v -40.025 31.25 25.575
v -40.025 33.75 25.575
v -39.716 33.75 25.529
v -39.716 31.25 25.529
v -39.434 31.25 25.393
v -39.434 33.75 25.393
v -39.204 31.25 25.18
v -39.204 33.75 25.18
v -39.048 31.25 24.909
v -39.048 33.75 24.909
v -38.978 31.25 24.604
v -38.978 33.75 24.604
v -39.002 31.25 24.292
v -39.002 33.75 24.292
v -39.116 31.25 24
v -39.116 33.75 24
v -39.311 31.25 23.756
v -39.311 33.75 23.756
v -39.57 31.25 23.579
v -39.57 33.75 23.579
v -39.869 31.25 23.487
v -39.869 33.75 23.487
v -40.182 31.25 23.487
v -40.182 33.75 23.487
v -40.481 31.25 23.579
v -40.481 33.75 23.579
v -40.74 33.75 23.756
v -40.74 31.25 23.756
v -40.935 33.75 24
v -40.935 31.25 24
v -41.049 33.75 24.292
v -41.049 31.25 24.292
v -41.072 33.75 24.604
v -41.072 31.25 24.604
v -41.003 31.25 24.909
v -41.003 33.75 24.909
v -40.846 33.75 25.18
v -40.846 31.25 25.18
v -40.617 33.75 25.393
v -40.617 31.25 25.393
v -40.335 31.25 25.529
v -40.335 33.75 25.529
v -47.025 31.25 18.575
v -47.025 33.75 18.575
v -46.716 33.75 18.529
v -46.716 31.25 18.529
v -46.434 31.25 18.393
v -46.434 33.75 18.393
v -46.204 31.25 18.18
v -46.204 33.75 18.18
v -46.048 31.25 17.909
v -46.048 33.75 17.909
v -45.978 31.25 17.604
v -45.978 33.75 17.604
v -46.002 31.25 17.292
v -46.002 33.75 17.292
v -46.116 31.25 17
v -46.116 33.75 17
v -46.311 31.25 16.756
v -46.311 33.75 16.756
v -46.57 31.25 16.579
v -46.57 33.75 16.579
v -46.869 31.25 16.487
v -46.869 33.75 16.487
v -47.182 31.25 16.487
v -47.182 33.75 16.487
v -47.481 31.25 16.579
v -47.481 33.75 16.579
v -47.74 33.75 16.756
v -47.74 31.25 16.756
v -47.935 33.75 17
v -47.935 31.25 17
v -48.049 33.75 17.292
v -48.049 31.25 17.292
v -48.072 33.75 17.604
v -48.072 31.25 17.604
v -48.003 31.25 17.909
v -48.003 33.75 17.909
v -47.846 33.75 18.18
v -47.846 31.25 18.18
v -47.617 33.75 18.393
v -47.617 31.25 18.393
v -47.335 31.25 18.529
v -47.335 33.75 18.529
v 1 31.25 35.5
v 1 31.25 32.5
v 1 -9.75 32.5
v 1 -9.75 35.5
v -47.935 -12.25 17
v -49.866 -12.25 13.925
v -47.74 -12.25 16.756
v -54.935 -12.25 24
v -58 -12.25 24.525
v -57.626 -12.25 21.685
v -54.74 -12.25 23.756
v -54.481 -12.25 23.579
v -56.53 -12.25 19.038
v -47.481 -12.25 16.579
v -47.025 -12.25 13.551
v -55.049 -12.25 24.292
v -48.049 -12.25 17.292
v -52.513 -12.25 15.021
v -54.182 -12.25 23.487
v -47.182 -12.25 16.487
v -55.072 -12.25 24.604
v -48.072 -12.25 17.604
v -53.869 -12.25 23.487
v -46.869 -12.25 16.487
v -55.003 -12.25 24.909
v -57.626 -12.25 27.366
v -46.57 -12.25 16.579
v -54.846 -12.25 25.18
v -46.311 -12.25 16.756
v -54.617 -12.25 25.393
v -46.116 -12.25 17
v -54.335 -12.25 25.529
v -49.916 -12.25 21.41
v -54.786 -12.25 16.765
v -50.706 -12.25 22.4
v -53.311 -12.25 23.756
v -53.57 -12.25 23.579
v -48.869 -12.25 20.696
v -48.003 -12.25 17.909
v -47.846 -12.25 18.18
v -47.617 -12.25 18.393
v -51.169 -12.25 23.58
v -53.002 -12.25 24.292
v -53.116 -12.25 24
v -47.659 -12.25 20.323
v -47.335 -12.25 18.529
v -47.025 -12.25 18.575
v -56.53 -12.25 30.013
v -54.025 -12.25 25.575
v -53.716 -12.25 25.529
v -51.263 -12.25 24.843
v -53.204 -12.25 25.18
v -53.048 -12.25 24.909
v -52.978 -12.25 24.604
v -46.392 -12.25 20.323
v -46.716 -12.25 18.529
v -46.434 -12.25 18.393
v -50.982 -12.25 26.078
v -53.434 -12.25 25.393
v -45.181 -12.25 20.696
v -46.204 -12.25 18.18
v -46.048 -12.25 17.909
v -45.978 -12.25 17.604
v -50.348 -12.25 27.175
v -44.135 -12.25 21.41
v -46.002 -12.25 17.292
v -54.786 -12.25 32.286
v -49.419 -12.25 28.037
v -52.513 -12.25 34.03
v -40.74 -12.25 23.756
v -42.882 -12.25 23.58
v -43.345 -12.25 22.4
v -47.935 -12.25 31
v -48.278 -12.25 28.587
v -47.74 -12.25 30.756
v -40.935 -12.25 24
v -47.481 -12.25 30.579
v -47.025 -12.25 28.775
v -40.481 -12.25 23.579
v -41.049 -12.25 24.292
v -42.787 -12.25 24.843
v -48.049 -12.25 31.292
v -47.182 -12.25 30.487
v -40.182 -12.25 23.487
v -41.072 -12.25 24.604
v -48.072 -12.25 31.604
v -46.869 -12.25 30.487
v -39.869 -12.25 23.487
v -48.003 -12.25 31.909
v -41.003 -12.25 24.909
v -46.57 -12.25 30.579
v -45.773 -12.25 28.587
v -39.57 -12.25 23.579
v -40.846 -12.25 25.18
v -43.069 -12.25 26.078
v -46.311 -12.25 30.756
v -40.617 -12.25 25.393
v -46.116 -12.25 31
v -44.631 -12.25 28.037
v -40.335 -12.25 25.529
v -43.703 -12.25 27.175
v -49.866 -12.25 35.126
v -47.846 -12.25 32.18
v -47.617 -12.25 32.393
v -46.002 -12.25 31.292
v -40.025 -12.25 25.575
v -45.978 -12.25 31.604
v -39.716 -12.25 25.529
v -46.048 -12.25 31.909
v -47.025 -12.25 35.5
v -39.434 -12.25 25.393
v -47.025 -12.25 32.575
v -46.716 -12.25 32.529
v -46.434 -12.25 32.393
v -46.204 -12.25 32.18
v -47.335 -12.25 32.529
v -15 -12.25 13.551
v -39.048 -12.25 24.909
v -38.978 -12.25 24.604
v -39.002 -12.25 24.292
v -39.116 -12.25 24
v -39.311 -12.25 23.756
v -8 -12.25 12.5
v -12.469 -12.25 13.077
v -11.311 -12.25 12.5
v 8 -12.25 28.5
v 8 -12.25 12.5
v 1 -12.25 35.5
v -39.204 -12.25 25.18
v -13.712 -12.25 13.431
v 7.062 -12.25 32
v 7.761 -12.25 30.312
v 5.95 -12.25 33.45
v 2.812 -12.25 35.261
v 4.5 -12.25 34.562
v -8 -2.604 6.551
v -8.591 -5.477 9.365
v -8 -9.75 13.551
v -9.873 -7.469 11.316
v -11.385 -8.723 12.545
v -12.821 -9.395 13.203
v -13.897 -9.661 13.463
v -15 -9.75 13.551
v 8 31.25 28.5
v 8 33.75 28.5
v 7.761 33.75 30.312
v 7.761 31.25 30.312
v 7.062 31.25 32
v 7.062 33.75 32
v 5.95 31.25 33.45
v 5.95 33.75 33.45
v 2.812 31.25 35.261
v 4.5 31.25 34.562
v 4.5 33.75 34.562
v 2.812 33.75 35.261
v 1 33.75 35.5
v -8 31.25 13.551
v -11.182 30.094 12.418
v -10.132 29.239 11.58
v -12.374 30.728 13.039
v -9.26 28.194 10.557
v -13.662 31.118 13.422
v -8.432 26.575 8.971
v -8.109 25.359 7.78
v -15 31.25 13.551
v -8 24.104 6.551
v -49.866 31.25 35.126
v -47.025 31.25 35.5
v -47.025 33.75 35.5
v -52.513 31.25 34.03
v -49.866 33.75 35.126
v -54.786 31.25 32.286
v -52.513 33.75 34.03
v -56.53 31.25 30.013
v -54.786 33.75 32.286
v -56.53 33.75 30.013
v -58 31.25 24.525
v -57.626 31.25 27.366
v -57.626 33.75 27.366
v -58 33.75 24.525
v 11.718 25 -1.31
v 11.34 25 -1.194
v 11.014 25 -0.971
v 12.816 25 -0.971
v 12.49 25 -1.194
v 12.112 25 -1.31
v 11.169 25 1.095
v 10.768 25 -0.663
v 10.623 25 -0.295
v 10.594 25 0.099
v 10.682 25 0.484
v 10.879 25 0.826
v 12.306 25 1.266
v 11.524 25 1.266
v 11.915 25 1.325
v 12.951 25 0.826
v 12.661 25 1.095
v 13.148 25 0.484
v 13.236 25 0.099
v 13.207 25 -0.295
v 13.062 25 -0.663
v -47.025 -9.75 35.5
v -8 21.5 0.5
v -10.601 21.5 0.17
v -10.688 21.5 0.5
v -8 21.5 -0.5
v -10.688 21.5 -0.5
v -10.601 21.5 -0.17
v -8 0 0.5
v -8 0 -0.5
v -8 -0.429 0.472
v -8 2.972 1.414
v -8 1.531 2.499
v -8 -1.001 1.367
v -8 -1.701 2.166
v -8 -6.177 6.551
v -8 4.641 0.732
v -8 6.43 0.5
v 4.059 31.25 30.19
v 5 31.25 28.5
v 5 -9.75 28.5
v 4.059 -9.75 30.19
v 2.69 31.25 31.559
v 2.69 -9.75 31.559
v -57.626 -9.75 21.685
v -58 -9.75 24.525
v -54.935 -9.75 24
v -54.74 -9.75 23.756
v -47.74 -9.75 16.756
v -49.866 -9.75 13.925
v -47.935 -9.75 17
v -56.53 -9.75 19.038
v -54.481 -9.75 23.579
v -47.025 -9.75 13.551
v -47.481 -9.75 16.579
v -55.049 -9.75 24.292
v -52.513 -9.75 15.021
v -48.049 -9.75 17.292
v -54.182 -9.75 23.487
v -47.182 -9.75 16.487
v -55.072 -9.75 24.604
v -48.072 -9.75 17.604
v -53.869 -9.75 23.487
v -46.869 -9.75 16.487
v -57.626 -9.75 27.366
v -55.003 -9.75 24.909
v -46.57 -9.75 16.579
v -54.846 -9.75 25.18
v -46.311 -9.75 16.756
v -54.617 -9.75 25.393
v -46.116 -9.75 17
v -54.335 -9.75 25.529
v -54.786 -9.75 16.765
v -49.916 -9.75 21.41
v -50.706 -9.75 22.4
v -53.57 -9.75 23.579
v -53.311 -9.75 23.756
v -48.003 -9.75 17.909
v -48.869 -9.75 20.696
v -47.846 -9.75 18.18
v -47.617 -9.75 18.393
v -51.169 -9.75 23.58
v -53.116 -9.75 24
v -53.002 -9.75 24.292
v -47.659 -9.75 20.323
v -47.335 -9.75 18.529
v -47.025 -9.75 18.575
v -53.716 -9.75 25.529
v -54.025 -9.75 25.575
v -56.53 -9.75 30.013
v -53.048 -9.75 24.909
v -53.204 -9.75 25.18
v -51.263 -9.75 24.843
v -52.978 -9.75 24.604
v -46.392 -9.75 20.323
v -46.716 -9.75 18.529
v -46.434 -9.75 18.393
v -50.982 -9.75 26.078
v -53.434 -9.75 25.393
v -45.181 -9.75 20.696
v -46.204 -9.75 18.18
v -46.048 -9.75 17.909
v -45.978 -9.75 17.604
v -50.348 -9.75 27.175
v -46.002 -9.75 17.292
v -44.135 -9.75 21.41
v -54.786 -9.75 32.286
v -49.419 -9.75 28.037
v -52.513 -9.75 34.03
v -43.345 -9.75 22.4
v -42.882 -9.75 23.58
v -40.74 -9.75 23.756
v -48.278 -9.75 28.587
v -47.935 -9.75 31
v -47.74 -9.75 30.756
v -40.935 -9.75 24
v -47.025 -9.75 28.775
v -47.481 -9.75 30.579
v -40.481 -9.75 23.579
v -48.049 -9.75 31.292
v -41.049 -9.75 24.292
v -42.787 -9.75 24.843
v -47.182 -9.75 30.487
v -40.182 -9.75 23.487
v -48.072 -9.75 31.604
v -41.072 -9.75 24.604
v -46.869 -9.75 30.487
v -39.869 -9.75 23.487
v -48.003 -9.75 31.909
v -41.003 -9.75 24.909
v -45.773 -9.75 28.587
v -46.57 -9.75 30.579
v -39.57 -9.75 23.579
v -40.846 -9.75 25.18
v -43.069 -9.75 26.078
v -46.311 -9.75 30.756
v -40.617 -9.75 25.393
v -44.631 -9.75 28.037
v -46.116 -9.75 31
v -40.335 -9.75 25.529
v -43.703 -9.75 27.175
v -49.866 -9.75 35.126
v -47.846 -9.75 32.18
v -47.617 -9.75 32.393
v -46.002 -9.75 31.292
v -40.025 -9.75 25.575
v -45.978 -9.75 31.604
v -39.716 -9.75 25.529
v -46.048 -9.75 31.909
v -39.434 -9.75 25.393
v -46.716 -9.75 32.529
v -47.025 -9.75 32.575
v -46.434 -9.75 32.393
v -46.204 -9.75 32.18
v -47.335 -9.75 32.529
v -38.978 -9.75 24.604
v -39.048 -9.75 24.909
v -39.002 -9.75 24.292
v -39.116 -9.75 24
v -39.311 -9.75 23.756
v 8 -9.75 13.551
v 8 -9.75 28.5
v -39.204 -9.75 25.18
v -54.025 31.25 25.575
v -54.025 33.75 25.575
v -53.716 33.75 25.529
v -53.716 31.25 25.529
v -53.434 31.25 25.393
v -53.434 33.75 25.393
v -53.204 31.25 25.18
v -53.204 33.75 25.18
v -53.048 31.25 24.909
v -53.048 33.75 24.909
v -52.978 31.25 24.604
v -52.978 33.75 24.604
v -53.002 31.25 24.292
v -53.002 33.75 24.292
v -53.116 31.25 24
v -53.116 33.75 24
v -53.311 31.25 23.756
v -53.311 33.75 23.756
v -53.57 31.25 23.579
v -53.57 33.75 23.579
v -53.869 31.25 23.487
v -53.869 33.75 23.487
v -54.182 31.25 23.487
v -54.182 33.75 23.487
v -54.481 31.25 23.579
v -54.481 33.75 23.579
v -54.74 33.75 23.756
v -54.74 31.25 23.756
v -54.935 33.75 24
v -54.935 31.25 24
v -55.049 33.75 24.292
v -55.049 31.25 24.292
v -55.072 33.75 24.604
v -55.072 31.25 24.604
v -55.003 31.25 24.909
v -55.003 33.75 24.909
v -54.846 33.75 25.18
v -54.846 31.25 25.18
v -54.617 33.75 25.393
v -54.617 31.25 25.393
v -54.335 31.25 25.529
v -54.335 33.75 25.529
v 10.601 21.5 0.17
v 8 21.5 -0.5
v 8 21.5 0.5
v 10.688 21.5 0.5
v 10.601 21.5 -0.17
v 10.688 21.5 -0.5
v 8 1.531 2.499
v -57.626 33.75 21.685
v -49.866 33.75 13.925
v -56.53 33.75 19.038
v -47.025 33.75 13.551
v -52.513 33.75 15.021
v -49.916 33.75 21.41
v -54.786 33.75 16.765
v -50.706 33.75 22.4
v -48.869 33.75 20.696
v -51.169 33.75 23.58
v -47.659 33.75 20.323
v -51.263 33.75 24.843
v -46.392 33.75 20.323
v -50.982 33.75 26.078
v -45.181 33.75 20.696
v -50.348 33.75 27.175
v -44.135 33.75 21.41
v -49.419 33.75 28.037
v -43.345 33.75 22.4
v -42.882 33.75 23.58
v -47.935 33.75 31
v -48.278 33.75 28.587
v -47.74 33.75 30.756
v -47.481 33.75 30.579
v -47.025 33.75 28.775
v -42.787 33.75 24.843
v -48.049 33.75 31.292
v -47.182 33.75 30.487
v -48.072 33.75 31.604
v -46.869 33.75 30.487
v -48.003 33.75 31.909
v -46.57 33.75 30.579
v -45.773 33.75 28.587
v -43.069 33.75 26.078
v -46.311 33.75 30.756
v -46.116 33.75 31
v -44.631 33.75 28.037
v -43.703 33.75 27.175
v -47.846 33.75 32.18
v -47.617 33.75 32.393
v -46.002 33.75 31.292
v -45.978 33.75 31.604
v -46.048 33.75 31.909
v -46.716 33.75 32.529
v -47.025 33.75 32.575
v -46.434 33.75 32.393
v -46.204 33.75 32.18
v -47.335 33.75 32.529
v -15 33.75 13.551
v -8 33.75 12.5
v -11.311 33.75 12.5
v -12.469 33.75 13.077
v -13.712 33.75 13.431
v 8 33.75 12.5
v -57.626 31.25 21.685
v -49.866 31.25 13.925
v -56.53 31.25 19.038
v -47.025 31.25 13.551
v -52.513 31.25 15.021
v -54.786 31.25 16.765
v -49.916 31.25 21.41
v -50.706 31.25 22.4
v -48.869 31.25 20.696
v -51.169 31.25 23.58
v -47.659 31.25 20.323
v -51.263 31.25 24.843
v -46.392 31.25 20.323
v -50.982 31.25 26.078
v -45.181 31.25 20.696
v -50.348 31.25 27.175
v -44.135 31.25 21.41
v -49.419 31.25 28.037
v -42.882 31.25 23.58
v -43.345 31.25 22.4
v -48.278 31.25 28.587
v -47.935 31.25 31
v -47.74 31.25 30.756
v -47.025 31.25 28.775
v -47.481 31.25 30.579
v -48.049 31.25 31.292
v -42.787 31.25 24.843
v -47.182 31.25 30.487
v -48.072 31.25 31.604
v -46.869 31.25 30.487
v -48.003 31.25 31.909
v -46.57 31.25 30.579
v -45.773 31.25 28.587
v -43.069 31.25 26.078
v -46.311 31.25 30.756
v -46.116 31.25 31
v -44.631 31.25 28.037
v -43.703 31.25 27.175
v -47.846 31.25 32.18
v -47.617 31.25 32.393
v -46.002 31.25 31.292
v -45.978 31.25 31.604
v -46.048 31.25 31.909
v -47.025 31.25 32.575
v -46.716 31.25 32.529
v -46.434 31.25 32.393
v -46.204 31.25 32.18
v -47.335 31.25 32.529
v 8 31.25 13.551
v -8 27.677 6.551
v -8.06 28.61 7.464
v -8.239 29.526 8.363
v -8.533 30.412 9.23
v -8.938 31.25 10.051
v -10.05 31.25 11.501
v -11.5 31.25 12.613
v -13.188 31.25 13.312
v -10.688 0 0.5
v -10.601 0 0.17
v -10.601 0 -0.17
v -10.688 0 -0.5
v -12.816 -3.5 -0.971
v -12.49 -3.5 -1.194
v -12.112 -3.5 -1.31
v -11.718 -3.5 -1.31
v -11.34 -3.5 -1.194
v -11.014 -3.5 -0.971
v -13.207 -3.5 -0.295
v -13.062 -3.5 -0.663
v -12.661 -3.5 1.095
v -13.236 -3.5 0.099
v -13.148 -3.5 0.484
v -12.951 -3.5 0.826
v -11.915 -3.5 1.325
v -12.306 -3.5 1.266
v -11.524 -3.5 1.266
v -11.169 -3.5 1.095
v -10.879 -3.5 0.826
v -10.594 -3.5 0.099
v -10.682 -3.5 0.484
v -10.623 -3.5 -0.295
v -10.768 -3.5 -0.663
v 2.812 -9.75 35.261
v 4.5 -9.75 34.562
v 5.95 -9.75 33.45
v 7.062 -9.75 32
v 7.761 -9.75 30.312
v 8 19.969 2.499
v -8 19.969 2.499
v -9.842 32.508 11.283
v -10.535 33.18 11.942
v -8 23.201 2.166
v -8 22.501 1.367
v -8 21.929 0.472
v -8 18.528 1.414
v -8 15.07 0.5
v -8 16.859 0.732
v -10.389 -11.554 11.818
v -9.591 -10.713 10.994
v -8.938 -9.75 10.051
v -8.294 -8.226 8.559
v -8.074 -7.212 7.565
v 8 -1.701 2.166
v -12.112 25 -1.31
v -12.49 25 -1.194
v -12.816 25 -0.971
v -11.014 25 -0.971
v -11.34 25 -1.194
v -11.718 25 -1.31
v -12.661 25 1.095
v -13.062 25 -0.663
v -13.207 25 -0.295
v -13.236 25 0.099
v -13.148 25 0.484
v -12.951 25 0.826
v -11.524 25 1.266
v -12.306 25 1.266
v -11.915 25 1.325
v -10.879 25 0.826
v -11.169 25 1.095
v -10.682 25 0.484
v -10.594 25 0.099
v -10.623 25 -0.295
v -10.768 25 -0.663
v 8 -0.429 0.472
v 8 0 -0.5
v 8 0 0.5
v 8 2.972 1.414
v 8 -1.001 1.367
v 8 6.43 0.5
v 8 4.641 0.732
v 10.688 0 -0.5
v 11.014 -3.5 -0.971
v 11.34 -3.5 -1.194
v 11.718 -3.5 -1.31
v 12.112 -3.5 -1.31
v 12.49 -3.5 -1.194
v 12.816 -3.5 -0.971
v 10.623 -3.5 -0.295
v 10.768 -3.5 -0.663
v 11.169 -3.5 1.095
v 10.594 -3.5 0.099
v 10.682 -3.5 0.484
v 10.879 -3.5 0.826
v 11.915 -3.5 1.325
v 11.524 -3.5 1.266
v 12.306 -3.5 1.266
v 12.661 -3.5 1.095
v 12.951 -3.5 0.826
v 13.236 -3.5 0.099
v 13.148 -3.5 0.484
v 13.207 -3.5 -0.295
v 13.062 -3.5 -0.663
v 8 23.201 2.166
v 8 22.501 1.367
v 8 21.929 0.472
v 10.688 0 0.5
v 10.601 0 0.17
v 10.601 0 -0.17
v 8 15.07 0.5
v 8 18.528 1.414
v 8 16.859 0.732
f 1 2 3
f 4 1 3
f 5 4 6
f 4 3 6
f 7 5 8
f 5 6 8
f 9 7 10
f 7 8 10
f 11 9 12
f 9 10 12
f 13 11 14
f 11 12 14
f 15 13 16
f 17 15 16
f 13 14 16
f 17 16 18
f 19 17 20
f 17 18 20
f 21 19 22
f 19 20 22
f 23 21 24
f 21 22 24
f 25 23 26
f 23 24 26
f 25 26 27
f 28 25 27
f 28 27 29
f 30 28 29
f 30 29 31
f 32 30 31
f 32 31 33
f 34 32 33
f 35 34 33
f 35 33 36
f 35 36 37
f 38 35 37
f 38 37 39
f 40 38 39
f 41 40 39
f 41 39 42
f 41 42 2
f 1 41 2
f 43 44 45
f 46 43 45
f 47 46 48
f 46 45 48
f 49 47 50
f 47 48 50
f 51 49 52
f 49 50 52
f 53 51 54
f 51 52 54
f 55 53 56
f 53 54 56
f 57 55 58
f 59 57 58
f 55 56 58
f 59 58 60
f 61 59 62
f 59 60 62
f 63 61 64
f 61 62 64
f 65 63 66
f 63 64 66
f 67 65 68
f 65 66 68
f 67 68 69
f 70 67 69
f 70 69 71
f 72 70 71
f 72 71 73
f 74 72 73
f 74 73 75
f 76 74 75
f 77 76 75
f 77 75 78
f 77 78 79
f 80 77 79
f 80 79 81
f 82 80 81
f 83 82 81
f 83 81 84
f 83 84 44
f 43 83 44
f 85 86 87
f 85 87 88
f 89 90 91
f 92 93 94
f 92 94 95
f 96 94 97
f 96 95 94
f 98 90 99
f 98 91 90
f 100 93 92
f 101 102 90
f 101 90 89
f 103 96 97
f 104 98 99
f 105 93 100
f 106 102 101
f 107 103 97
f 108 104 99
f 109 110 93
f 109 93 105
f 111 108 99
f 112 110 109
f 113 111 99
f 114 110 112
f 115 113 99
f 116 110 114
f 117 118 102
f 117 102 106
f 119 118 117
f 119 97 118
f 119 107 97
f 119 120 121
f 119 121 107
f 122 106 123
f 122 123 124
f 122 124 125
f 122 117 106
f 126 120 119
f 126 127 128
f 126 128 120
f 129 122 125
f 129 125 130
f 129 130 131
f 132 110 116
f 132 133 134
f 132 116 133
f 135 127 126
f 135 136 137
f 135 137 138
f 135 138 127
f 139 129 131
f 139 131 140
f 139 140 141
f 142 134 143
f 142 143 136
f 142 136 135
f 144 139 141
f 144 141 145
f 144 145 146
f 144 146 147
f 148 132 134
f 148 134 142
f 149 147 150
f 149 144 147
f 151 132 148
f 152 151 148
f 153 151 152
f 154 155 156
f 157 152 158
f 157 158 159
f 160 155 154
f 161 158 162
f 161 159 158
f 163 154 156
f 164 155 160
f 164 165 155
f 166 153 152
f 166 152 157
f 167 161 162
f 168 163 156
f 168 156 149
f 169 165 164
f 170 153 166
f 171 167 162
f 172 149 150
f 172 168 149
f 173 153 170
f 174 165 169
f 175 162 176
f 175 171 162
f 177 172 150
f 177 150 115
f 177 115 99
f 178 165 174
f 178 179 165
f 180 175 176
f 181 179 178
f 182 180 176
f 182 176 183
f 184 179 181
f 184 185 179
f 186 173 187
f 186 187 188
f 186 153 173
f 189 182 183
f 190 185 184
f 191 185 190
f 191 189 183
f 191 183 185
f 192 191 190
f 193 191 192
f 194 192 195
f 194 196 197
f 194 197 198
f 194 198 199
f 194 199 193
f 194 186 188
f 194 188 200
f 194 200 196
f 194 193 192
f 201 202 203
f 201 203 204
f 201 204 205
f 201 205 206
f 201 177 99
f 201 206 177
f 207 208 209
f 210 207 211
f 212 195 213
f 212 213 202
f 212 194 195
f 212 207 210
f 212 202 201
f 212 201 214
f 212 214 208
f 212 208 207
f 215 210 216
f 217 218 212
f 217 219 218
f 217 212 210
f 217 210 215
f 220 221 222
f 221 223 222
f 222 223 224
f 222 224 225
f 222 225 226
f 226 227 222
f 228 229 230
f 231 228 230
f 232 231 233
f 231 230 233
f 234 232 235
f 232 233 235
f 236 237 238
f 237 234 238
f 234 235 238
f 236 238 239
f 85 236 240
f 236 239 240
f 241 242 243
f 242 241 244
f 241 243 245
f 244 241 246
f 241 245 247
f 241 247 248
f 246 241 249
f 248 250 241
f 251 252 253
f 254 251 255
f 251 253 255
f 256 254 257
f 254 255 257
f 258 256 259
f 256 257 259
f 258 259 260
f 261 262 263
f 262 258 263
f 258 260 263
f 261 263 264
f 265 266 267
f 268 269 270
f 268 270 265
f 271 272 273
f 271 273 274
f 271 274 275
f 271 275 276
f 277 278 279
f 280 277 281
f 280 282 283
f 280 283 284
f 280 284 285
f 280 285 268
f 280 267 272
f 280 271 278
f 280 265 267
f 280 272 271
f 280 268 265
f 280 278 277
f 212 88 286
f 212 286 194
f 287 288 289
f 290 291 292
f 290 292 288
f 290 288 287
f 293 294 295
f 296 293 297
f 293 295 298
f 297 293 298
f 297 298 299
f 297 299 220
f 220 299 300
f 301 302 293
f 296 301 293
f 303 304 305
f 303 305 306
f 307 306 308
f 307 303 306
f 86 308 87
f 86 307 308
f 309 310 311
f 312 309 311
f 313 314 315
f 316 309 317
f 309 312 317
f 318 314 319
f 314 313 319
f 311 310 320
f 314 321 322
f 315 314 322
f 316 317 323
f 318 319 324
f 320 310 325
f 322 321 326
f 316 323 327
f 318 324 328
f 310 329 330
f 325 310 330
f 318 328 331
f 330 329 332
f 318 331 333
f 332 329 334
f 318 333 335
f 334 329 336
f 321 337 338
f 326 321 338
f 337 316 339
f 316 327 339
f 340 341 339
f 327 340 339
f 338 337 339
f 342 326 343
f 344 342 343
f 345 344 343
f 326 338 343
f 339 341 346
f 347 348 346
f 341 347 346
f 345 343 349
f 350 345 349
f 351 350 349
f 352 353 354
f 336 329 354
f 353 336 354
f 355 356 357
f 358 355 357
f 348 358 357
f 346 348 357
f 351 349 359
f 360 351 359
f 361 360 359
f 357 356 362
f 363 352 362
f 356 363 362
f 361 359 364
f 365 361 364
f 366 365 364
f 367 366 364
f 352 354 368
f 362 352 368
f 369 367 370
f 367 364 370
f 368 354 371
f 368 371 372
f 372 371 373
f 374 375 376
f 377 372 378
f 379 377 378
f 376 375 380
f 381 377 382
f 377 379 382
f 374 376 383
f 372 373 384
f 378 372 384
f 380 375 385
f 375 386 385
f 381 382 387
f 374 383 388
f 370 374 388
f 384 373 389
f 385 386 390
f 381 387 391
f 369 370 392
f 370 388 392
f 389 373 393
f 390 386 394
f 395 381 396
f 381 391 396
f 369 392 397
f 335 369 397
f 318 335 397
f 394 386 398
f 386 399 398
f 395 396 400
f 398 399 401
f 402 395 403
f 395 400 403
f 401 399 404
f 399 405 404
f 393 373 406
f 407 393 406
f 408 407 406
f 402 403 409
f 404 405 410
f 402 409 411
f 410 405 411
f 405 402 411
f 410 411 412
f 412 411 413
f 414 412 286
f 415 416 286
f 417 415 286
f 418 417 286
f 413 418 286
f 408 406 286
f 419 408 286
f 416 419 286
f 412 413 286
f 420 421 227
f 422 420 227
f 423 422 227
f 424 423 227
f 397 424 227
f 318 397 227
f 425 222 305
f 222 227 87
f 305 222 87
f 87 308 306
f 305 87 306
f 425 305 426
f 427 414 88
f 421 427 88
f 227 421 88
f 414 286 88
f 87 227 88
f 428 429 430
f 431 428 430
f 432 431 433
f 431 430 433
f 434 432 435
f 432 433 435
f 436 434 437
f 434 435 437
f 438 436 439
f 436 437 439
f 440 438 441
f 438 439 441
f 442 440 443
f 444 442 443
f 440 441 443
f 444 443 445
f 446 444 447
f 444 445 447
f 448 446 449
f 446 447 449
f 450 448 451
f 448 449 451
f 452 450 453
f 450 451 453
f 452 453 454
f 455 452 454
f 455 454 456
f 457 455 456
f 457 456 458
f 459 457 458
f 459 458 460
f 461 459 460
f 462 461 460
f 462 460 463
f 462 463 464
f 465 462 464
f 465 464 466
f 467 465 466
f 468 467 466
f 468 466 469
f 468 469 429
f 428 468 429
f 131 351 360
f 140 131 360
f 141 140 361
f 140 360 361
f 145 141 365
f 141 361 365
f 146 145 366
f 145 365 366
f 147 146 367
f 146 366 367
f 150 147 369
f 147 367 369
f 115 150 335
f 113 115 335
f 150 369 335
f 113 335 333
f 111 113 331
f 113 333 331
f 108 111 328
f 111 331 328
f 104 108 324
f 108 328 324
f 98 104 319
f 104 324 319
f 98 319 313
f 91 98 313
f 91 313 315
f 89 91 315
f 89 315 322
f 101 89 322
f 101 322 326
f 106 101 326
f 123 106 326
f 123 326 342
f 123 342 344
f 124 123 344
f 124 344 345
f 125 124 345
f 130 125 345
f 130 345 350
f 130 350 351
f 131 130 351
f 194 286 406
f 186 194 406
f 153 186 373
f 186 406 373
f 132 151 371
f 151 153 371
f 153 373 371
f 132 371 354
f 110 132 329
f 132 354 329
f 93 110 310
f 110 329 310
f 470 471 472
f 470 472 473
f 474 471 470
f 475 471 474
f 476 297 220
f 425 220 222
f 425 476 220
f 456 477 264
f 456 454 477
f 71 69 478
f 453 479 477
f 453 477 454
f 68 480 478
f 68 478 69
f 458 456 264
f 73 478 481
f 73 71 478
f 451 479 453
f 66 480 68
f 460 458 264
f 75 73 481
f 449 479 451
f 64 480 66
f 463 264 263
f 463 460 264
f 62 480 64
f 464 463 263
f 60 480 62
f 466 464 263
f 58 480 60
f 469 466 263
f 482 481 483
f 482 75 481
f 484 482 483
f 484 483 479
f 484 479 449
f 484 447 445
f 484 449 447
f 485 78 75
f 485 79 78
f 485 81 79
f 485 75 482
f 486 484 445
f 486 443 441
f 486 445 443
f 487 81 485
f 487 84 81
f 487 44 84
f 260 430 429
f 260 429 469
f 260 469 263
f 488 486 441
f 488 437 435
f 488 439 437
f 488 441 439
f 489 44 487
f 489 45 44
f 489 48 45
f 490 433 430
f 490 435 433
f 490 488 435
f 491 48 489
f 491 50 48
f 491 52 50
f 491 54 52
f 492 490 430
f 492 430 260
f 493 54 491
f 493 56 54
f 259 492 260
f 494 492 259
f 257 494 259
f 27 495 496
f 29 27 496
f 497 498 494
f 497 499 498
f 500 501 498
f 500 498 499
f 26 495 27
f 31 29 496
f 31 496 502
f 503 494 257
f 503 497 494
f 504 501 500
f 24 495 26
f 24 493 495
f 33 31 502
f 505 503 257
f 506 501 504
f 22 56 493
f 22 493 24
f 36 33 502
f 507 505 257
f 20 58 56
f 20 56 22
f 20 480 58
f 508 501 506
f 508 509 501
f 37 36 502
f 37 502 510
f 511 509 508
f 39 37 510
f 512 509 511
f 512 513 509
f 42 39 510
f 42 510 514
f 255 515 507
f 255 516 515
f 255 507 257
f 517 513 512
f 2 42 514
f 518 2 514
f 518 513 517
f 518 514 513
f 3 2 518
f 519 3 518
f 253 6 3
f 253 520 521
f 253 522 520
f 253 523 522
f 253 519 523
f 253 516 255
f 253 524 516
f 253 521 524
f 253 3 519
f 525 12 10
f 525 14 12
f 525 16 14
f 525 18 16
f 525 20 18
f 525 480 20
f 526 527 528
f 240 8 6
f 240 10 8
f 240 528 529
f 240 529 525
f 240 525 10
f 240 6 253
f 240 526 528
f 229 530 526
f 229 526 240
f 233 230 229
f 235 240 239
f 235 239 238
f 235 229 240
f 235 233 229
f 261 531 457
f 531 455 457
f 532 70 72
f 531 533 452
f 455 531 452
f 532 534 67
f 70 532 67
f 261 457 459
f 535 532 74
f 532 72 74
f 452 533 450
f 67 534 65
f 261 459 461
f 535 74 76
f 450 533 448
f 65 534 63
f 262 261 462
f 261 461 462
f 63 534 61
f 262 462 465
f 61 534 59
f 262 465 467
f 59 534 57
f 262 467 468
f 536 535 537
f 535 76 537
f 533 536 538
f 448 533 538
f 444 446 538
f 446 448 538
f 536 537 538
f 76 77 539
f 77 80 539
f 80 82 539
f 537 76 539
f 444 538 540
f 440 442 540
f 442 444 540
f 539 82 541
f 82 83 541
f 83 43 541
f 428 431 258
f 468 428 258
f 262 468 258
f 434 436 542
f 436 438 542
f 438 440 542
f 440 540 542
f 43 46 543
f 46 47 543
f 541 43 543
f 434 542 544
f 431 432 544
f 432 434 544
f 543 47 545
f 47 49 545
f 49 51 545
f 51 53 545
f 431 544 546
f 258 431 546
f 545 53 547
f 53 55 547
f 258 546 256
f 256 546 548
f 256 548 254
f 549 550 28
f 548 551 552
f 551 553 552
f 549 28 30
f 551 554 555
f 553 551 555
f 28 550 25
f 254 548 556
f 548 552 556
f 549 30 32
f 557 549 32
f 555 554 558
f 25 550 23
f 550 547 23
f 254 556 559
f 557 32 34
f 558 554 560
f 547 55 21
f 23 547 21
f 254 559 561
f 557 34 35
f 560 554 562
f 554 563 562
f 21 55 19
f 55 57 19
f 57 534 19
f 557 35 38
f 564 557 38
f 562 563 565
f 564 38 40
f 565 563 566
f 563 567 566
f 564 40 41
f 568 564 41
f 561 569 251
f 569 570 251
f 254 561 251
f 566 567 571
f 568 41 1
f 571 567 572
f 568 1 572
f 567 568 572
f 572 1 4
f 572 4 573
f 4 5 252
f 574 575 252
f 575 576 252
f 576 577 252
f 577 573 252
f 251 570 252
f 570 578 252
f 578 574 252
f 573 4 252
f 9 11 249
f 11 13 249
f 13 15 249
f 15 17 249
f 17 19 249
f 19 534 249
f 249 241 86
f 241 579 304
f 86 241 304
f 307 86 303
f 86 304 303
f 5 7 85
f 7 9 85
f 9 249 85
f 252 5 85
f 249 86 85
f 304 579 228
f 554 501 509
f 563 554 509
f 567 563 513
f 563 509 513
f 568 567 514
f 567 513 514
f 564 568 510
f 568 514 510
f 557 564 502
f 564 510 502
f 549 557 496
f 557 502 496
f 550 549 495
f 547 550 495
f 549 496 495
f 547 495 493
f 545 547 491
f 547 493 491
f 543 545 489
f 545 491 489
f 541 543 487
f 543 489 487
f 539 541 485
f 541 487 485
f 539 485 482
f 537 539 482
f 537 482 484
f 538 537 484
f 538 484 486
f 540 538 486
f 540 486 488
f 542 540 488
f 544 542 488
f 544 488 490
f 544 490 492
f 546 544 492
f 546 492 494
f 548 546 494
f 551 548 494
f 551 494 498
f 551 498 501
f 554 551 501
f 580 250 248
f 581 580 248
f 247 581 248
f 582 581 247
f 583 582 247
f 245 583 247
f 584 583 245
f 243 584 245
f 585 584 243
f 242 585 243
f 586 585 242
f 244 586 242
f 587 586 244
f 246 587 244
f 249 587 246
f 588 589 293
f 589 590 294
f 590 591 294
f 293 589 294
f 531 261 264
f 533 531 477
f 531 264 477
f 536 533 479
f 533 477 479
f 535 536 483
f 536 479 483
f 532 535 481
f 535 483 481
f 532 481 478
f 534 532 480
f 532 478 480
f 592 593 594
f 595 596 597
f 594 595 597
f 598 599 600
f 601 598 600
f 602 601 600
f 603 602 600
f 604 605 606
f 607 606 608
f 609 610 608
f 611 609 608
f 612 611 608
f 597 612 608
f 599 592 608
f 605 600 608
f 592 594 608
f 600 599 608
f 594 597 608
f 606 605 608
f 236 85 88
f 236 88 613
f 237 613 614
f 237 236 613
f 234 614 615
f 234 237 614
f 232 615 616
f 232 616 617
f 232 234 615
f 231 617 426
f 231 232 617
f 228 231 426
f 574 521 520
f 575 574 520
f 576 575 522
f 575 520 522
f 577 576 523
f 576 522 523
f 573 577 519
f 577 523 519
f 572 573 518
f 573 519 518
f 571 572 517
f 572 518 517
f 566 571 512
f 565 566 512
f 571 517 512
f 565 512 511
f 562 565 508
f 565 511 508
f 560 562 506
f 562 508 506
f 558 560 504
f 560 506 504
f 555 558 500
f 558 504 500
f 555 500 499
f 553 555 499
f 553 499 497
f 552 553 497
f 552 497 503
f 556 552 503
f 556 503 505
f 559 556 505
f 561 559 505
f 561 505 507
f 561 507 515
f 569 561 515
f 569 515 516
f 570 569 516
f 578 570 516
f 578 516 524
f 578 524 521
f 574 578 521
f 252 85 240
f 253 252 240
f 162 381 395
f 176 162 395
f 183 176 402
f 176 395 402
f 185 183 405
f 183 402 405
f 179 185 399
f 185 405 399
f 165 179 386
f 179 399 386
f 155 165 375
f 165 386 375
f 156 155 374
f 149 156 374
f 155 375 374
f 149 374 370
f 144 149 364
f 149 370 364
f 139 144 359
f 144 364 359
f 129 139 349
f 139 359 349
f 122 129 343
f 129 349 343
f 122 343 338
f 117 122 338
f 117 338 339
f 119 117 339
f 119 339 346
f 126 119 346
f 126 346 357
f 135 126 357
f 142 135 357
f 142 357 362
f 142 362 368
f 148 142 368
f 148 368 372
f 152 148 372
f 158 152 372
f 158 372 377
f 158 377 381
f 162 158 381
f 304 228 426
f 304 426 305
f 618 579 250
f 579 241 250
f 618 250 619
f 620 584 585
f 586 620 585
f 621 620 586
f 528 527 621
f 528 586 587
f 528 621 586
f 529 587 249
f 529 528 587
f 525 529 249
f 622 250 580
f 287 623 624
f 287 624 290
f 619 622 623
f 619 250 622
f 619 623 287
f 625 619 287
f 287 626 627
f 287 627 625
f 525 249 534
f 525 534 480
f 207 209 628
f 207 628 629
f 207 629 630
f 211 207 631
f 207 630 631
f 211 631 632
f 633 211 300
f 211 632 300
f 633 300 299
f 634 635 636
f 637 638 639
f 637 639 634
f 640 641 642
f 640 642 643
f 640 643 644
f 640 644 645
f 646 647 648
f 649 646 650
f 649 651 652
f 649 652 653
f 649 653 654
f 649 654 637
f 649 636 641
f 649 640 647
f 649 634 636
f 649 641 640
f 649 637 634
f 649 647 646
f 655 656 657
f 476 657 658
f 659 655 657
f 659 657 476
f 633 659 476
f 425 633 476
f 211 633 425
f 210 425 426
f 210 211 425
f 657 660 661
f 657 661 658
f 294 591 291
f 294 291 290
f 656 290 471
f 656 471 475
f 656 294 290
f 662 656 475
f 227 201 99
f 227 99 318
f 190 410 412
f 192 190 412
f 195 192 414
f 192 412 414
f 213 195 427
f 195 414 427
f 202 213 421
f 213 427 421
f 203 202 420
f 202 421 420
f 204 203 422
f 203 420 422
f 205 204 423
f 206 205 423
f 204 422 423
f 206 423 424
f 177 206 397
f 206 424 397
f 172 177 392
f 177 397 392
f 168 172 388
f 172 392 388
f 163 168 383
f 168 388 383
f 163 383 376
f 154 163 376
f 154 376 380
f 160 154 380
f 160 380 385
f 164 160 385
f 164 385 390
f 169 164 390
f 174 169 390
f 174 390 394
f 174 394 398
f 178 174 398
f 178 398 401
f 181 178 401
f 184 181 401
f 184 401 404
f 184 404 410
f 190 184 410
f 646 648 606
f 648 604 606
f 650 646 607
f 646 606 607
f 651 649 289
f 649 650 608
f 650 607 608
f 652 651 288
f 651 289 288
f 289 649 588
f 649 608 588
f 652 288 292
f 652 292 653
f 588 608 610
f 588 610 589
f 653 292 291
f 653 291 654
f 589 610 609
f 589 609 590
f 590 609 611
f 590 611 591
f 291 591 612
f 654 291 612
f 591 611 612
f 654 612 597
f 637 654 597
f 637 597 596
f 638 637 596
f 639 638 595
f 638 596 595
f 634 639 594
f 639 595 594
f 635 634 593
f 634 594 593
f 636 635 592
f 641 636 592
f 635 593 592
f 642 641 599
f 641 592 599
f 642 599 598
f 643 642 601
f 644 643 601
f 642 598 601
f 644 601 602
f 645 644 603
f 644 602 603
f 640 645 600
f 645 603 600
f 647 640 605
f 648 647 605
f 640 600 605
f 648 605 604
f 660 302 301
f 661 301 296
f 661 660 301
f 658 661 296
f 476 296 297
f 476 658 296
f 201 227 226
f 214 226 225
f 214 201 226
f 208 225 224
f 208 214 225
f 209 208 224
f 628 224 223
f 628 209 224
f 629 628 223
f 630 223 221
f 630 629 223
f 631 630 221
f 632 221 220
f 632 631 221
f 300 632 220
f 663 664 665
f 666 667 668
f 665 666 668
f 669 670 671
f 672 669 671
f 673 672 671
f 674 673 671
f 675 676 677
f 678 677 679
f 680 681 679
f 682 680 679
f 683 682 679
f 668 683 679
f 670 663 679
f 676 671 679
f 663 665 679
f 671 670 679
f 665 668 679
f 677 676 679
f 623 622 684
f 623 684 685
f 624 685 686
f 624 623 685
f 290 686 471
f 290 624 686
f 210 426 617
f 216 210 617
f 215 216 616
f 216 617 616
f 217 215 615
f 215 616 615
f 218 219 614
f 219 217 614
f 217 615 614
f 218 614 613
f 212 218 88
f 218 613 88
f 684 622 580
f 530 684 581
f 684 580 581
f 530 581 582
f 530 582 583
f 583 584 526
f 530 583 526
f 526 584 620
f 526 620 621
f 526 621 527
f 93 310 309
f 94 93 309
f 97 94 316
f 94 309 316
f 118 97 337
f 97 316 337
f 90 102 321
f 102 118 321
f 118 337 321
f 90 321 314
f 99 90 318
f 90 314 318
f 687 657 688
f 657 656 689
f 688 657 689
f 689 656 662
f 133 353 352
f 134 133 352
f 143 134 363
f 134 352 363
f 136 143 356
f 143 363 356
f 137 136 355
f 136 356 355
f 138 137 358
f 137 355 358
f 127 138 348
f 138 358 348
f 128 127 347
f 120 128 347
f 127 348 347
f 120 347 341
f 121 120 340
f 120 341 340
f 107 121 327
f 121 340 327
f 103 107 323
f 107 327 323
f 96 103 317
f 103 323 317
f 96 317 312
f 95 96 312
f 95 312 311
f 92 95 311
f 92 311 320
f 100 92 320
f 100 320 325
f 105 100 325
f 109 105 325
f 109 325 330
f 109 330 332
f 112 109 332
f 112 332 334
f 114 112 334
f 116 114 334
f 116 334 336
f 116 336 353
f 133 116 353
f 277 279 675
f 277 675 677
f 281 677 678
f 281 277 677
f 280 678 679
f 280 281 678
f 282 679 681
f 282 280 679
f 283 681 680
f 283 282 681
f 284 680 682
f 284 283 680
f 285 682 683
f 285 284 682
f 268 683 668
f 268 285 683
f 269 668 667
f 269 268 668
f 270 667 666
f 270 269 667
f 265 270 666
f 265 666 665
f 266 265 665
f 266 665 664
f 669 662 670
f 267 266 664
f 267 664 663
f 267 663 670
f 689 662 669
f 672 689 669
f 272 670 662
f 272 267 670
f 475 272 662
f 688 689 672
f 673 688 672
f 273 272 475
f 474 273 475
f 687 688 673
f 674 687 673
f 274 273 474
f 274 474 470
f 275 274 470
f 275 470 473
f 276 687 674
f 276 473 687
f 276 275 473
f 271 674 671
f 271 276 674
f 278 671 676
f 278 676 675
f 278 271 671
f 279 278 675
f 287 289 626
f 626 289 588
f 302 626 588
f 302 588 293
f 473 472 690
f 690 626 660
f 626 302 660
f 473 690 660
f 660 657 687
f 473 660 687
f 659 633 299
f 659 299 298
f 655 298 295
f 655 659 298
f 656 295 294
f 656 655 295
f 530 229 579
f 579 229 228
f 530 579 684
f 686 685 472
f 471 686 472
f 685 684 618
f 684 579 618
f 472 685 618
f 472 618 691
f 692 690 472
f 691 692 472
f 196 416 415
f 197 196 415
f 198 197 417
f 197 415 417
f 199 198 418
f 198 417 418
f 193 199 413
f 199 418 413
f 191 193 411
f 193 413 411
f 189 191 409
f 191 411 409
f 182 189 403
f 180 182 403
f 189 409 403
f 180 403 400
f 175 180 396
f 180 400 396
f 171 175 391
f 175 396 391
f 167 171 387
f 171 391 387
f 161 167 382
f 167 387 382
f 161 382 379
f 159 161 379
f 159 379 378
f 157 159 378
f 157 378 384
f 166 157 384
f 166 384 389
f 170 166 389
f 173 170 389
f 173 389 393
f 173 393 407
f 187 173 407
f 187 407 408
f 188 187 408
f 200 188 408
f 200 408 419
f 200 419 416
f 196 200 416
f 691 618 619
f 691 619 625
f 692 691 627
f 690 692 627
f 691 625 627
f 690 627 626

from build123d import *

# Parameters (mm, degrees)
SKETCH1_W           = 23.83
SKETCH1_H           = 1
BOSS_EXTRUDE1_DEPTH = 21.5
SKETCH2_R           = 1.325
BOSS_EXTRUDE2_DEPTH = 14.25
BOSS_EXTRUDE4_DEPTH = 8
SKETCH5_W           = 21.949336604
SKETCH5_H           = 2.5
BOSS_EXTRUDE5_DEPTH = 50
SKETCH6_R           = 4.25
SKETCH6_R_2         = 1.05
CUT_EXTRUDE1_DEPTH  = 83.099025573
FILLET1_R           = 7
FILLET2_R           = 7
FILLET3_R           = 7
BOSS_EXTRUDE6_START = 41
BOSS_EXTRUDE6_DEPTH = 41


with BuildPart() as part:
    # Sketch1 → Boss-Extrude1 (new body)
    with BuildSketch(Plane(origin=(0, 0, 0), x_dir=(1, 0, 0), z_dir=(0, 1, 0))):
        Rectangle(SKETCH1_W, SKETCH1_H)
    extrude(amount=BOSS_EXTRUDE1_DEPTH)

    # Sketch2 → Boss-Extrude2 (add, symmetric)
    with BuildSketch(Plane(origin=(0, 10.75, 0), x_dir=(1, 0, 0), z_dir=(0, 1, 0))):
        with Locations(Location((-11.915, 0, 0), (0, 0, 270))):
            Circle(SKETCH2_R)
        with Locations(Location((11.915, 0, 0), (0, 0, 270))):
            Circle(SKETCH2_R)
    extrude(amount=BOSS_EXTRUDE2_DEPTH, both=True)

    # Sketch4 → Boss-Extrude4 (add, symmetric)
    with BuildSketch(Plane(origin=(0, 0, 0), x_dir=(0, 0, -1), z_dir=(1, 0, 0))):
        Polygon((-0.5, 17.927447783), (-0.5, 21.5), (-12.5, 33.75), (-35.5, 33.75), (-35.5, 31.25), (-13.550663396, 31.25), align=None)
        Polygon((-0.5, 0), (-0.5, 3.572552217), (-13.550663396, -9.75), (-35.5, -9.75), (-35.5, -12.25), (-12.5, -12.25), align=None)
    extrude(amount=BOSS_EXTRUDE4_DEPTH, both=True)

    # Sketch5 → Boss-Extrude5 (add)
    with BuildSketch(Plane.ZY.offset(8)):
        with Locations((24.525331698, 32.5)):
            Rectangle(SKETCH5_W, SKETCH5_H)
        with Locations((24.525331698, -11)):
            Rectangle(SKETCH5_W, SKETCH5_H)
    extrude(amount=BOSS_EXTRUDE5_DEPTH)

    # Sketch6 → Cut-Extrude1 (cut, through all)
    with BuildSketch(Plane(origin=(0, 33.75, 0), x_dir=(1, 0, 0), z_dir=(0, 1, 0))):
        with Locations(Location((-47.025331698, -24.525331698, 0), (0, 0, 270))):
            Circle(SKETCH6_R)
        with Locations(Location((-54.025331698, -24.525331698, 0), (0, 0, 270))):
            Circle(SKETCH6_R_2)
        with Locations(Location((-47.025331698, -17.525331698, 0), (0, 0, 270))):
            Circle(SKETCH6_R_2)
        with Locations(Location((-40.025331698, -24.525331698, 0), (0, 0, 270))):
            Circle(SKETCH6_R_2)
        with Locations(Location((-47.025331698, -31.525331698, 0), (0, 0, 270))):
            Circle(SKETCH6_R_2)
        with BuildLine():
            ThreePointArc((-58, -24.525331743), (-54.785594092, -16.765069336), (-47.025331698, -13.550663396))
            Line((-47.025331698, -13.550663396), (-58, -13.550663396))
            Line((-58, -13.550663396), (-58, -24.525331743))
        make_face()
        with BuildLine():
            ThreePointArc((-47.025331698, -35.5), (-54.78559406, -32.285594092), (-58, -24.525331743))
            Line((-58, -24.525331743), (-58, -35.5))
            Line((-58, -35.5), (-47.025331698, -35.5))
        make_face()
    extrude(amount=-CUT_EXTRUDE1_DEPTH, mode=Mode.SUBTRACT)

    # Fillet1
    # the kernel refuses this fillet: 7 mm, written as the material it adds along each edge
    with BuildSketch(Plane(origin=(-8, -12.25, 13.550663396), x_dir=(-1, 0, 0), z_dir=(0, 1, 0))) as fillet1_piece_1_section:
        with BuildLine():
            CenterArc((FILLET1_R, -FILLET1_R), FILLET1_R, 90, 90)
            Line((0, -FILLET1_R), (0, 0))
            Line((0, 0), (FILLET1_R, 0))
        make_face()
    fillet1_piece_1 = extrude(amount=2.5, mode=Mode.PRIVATE)
    fillet1_piece_1 = split(fillet1_piece_1, bisect_by=Plane(origin=(-10.015975833, -11.661011889, 11.923032054), z_dir=(0, 0.699779834816443, 0.7143585813751185)), keep=Keep.TOP, mode=Mode.PRIVATE)
    fillet1_piece_1 = split(fillet1_piece_1, bisect_by=Plane(origin=(-10.015975833, -9.911562302, 13.708928508), z_dir=(0, -0.699779834816443, -0.7143585813751185)), keep=Keep.TOP, mode=Mode.PRIVATE)
    add(fillet1_piece_1)
    with BuildSketch(Plane(origin=(-8, -12.25, 13.550663396), x_dir=(-1, 0, 0), z_dir=(0, 1, 0))) as fillet1_piece_2_section:
        with BuildLine():
            CenterArc((FILLET1_R, -FILLET1_R), FILLET1_R, 90, 90)
            Line((0, -FILLET1_R), (0, 0))
            Line((0, 0), (FILLET1_R, 0))
        make_face()
    fillet1_piece_2 = extrude(amount=20, mode=Mode.PRIVATE)
    fillet1_piece_2 = split(fillet1_piece_2, bisect_by=Plane(origin=(-8.812454151, -9.294822672, 9.605132414), z_dir=(0, 0.699779834816443, 0.7143585813751185)), keep=Keep.TOP, mode=Mode.PRIVATE)
    fillet1_piece_2 = split(fillet1_piece_2, bisect_by=Plane(origin=(-8.812454151, -9.75, 10.768831879), z_dir=(0, 1, 0)), keep=Keep.TOP, mode=Mode.PRIVATE)
    fillet1_piece_2 = split(fillet1_piece_2, bisect_by=Plane(origin=(-8.812454151, -7.545373085, 11.391028867), z_dir=(0, -0.699779834816443, -0.7143585813751185)), keep=Keep.TOP, mode=Mode.PRIVATE)
    add(fillet1_piece_2)
    with BuildSketch(Plane(origin=(-8, 33.75, 13.550663396), x_dir=(0, 0, -1), z_dir=(0, -1, 0))) as fillet1_piece_3_section:
        with BuildLine():
            CenterArc((FILLET1_R, -FILLET1_R), FILLET1_R, 90, 90)
            Line((0, -FILLET1_R), (0, 0))
            Line((0, 0), (FILLET1_R, 0))
        make_face()
    fillet1_piece_3 = extrude(amount=2.5, mode=Mode.PRIVATE)
    fillet1_piece_3 = split(fillet1_piece_3, bisect_by=Plane(origin=(-10.015975833, 31.411562301, 13.708928507), z_dir=(0, 0.6997798348164432, -0.7143585813751182)), keep=Keep.TOP, mode=Mode.PRIVATE)
    fillet1_piece_3 = split(fillet1_piece_3, bisect_by=Plane(origin=(-10.015975833, 33.161011889, 11.923032054), z_dir=(0, -0.699779834816443, 0.7143585813751185)), keep=Keep.TOP, mode=Mode.PRIVATE)
    add(fillet1_piece_3)
    with BuildSketch(Plane(origin=(-8, 33.75, 13.550663396), x_dir=(0, 0, -1), z_dir=(0, -1, 0))) as fillet1_piece_4_section:
        with BuildLine():
            CenterArc((FILLET1_R, -FILLET1_R), FILLET1_R, 90, 90)
            Line((0, -FILLET1_R), (0, 0))
            Line((0, 0), (FILLET1_R, 0))
        make_face()
    fillet1_piece_4 = extrude(amount=20, mode=Mode.PRIVATE)
    fillet1_piece_4 = split(fillet1_piece_4, bisect_by=Plane(origin=(-8.812454159, 29.045373088, 11.39102887), z_dir=(0, 0.6997798348164432, -0.7143585813751182)), keep=Keep.TOP, mode=Mode.PRIVATE)
    fillet1_piece_4 = split(fillet1_piece_4, bisect_by=Plane(origin=(-8.812454159, 30.794822675, 9.605132416), z_dir=(0, -0.699779834816443, 0.7143585813751185)), keep=Keep.TOP, mode=Mode.PRIVATE)
    fillet1_piece_4 = split(fillet1_piece_4, bisect_by=Plane(origin=(-8.812454159, 31.25, 10.768831882), z_dir=(0, -1, 0)), keep=Keep.TOP, mode=Mode.PRIVATE)
    add(fillet1_piece_4)
    # the kernel refuses this fillet: 7 mm, written as the material it takes off along each edge
    with BuildSketch(Plane(origin=(8, 7.75, 35.5), x_dir=(0, 0, -1), z_dir=(0, -1, 0))) as fillet1_2_piece_1:
        with BuildLine():
            CenterArc((FILLET1_R, -FILLET1_R), FILLET1_R, 90, 90)
            Line((0, -FILLET1_R), (0, 0))
            Line((0, 0), (FILLET1_R, 0))
        make_face()
    extrude(amount=37.5, mode=Mode.SUBTRACT)
    with BuildSketch(Plane(origin=(8, 51.25, 35.5), x_dir=(-1, 0, 0), z_dir=(0, -1, 0))) as fillet1_2_piece_2:
        with BuildLine():
            CenterArc((FILLET1_R, FILLET1_R), FILLET1_R, 180, 90)
            Line((0, FILLET1_R), (0, 0))
            Line((0, 0), (FILLET1_R, 0))
        make_face()
    extrude(amount=37.5, mode=Mode.SUBTRACT)

    # Fillet2
    fillet2_edges = [part.edges().sort_by_distance(p)[0] for p in [
        (0, 17.927447783, 0.5),
        (0, 3.572552217, 0.5),
    ]]
    fillet(fillet2_edges, radius=FILLET2_R)

    # Fillet3
    # the kernel refuses this fillet: 7 mm, written as the material it adds along each edge
    with BuildSketch(Plane(origin=(-8, 21.5, 0.5), x_dir=(0, 0.7143585813744706, 0.6997798348171044), z_dir=(1, 0, 0))) as fillet3_piece_1:
        with BuildLine():
            CenterArc((2.380920079, -7), FILLET3_R, 90, 26.110260914)
            Line((-0.699779835, -0.714358581), (0, 0))
            Line((0, 0), (2.380920079, 0))
        make_face()
    extrude(amount=16)
    with BuildSketch(Plane(origin=(8, 0, 0.5), x_dir=(0, 0, -1), z_dir=(-1, 0, 0))) as fillet3_piece_2:
        with BuildLine():
            CenterArc((3.33439021, 6.599289533), FILLET3_R, 224.409342785, 26.110260914)
            Line((-1.666119859, 1.70083069), (0, 0))
            Line((0, 0), (1, 0))
        make_face()
    extrude(amount=16)

    # Sketch8 → Boss-Extrude6 (add)
    with BuildSketch(Plane(origin=(0, -9.75, 0), x_dir=(1, 0, 0), z_dir=(0, 1, 0)).offset(BOSS_EXTRUDE6_START)):
        with BuildLine():
            ThreePointArc((1, -35.5), (5.949747468, -33.449747468), (8, -28.5))
            Line((8, -28.5), (5, -28.5))
            ThreePointArc((5, -28.5), (3.422054899, -30.922054899), (1, -32.5))
            Line((1, -32.5), (1, -35.5))
        make_face()
    extrude(amount=-BOSS_EXTRUDE6_DEPTH)


solid = part.part
